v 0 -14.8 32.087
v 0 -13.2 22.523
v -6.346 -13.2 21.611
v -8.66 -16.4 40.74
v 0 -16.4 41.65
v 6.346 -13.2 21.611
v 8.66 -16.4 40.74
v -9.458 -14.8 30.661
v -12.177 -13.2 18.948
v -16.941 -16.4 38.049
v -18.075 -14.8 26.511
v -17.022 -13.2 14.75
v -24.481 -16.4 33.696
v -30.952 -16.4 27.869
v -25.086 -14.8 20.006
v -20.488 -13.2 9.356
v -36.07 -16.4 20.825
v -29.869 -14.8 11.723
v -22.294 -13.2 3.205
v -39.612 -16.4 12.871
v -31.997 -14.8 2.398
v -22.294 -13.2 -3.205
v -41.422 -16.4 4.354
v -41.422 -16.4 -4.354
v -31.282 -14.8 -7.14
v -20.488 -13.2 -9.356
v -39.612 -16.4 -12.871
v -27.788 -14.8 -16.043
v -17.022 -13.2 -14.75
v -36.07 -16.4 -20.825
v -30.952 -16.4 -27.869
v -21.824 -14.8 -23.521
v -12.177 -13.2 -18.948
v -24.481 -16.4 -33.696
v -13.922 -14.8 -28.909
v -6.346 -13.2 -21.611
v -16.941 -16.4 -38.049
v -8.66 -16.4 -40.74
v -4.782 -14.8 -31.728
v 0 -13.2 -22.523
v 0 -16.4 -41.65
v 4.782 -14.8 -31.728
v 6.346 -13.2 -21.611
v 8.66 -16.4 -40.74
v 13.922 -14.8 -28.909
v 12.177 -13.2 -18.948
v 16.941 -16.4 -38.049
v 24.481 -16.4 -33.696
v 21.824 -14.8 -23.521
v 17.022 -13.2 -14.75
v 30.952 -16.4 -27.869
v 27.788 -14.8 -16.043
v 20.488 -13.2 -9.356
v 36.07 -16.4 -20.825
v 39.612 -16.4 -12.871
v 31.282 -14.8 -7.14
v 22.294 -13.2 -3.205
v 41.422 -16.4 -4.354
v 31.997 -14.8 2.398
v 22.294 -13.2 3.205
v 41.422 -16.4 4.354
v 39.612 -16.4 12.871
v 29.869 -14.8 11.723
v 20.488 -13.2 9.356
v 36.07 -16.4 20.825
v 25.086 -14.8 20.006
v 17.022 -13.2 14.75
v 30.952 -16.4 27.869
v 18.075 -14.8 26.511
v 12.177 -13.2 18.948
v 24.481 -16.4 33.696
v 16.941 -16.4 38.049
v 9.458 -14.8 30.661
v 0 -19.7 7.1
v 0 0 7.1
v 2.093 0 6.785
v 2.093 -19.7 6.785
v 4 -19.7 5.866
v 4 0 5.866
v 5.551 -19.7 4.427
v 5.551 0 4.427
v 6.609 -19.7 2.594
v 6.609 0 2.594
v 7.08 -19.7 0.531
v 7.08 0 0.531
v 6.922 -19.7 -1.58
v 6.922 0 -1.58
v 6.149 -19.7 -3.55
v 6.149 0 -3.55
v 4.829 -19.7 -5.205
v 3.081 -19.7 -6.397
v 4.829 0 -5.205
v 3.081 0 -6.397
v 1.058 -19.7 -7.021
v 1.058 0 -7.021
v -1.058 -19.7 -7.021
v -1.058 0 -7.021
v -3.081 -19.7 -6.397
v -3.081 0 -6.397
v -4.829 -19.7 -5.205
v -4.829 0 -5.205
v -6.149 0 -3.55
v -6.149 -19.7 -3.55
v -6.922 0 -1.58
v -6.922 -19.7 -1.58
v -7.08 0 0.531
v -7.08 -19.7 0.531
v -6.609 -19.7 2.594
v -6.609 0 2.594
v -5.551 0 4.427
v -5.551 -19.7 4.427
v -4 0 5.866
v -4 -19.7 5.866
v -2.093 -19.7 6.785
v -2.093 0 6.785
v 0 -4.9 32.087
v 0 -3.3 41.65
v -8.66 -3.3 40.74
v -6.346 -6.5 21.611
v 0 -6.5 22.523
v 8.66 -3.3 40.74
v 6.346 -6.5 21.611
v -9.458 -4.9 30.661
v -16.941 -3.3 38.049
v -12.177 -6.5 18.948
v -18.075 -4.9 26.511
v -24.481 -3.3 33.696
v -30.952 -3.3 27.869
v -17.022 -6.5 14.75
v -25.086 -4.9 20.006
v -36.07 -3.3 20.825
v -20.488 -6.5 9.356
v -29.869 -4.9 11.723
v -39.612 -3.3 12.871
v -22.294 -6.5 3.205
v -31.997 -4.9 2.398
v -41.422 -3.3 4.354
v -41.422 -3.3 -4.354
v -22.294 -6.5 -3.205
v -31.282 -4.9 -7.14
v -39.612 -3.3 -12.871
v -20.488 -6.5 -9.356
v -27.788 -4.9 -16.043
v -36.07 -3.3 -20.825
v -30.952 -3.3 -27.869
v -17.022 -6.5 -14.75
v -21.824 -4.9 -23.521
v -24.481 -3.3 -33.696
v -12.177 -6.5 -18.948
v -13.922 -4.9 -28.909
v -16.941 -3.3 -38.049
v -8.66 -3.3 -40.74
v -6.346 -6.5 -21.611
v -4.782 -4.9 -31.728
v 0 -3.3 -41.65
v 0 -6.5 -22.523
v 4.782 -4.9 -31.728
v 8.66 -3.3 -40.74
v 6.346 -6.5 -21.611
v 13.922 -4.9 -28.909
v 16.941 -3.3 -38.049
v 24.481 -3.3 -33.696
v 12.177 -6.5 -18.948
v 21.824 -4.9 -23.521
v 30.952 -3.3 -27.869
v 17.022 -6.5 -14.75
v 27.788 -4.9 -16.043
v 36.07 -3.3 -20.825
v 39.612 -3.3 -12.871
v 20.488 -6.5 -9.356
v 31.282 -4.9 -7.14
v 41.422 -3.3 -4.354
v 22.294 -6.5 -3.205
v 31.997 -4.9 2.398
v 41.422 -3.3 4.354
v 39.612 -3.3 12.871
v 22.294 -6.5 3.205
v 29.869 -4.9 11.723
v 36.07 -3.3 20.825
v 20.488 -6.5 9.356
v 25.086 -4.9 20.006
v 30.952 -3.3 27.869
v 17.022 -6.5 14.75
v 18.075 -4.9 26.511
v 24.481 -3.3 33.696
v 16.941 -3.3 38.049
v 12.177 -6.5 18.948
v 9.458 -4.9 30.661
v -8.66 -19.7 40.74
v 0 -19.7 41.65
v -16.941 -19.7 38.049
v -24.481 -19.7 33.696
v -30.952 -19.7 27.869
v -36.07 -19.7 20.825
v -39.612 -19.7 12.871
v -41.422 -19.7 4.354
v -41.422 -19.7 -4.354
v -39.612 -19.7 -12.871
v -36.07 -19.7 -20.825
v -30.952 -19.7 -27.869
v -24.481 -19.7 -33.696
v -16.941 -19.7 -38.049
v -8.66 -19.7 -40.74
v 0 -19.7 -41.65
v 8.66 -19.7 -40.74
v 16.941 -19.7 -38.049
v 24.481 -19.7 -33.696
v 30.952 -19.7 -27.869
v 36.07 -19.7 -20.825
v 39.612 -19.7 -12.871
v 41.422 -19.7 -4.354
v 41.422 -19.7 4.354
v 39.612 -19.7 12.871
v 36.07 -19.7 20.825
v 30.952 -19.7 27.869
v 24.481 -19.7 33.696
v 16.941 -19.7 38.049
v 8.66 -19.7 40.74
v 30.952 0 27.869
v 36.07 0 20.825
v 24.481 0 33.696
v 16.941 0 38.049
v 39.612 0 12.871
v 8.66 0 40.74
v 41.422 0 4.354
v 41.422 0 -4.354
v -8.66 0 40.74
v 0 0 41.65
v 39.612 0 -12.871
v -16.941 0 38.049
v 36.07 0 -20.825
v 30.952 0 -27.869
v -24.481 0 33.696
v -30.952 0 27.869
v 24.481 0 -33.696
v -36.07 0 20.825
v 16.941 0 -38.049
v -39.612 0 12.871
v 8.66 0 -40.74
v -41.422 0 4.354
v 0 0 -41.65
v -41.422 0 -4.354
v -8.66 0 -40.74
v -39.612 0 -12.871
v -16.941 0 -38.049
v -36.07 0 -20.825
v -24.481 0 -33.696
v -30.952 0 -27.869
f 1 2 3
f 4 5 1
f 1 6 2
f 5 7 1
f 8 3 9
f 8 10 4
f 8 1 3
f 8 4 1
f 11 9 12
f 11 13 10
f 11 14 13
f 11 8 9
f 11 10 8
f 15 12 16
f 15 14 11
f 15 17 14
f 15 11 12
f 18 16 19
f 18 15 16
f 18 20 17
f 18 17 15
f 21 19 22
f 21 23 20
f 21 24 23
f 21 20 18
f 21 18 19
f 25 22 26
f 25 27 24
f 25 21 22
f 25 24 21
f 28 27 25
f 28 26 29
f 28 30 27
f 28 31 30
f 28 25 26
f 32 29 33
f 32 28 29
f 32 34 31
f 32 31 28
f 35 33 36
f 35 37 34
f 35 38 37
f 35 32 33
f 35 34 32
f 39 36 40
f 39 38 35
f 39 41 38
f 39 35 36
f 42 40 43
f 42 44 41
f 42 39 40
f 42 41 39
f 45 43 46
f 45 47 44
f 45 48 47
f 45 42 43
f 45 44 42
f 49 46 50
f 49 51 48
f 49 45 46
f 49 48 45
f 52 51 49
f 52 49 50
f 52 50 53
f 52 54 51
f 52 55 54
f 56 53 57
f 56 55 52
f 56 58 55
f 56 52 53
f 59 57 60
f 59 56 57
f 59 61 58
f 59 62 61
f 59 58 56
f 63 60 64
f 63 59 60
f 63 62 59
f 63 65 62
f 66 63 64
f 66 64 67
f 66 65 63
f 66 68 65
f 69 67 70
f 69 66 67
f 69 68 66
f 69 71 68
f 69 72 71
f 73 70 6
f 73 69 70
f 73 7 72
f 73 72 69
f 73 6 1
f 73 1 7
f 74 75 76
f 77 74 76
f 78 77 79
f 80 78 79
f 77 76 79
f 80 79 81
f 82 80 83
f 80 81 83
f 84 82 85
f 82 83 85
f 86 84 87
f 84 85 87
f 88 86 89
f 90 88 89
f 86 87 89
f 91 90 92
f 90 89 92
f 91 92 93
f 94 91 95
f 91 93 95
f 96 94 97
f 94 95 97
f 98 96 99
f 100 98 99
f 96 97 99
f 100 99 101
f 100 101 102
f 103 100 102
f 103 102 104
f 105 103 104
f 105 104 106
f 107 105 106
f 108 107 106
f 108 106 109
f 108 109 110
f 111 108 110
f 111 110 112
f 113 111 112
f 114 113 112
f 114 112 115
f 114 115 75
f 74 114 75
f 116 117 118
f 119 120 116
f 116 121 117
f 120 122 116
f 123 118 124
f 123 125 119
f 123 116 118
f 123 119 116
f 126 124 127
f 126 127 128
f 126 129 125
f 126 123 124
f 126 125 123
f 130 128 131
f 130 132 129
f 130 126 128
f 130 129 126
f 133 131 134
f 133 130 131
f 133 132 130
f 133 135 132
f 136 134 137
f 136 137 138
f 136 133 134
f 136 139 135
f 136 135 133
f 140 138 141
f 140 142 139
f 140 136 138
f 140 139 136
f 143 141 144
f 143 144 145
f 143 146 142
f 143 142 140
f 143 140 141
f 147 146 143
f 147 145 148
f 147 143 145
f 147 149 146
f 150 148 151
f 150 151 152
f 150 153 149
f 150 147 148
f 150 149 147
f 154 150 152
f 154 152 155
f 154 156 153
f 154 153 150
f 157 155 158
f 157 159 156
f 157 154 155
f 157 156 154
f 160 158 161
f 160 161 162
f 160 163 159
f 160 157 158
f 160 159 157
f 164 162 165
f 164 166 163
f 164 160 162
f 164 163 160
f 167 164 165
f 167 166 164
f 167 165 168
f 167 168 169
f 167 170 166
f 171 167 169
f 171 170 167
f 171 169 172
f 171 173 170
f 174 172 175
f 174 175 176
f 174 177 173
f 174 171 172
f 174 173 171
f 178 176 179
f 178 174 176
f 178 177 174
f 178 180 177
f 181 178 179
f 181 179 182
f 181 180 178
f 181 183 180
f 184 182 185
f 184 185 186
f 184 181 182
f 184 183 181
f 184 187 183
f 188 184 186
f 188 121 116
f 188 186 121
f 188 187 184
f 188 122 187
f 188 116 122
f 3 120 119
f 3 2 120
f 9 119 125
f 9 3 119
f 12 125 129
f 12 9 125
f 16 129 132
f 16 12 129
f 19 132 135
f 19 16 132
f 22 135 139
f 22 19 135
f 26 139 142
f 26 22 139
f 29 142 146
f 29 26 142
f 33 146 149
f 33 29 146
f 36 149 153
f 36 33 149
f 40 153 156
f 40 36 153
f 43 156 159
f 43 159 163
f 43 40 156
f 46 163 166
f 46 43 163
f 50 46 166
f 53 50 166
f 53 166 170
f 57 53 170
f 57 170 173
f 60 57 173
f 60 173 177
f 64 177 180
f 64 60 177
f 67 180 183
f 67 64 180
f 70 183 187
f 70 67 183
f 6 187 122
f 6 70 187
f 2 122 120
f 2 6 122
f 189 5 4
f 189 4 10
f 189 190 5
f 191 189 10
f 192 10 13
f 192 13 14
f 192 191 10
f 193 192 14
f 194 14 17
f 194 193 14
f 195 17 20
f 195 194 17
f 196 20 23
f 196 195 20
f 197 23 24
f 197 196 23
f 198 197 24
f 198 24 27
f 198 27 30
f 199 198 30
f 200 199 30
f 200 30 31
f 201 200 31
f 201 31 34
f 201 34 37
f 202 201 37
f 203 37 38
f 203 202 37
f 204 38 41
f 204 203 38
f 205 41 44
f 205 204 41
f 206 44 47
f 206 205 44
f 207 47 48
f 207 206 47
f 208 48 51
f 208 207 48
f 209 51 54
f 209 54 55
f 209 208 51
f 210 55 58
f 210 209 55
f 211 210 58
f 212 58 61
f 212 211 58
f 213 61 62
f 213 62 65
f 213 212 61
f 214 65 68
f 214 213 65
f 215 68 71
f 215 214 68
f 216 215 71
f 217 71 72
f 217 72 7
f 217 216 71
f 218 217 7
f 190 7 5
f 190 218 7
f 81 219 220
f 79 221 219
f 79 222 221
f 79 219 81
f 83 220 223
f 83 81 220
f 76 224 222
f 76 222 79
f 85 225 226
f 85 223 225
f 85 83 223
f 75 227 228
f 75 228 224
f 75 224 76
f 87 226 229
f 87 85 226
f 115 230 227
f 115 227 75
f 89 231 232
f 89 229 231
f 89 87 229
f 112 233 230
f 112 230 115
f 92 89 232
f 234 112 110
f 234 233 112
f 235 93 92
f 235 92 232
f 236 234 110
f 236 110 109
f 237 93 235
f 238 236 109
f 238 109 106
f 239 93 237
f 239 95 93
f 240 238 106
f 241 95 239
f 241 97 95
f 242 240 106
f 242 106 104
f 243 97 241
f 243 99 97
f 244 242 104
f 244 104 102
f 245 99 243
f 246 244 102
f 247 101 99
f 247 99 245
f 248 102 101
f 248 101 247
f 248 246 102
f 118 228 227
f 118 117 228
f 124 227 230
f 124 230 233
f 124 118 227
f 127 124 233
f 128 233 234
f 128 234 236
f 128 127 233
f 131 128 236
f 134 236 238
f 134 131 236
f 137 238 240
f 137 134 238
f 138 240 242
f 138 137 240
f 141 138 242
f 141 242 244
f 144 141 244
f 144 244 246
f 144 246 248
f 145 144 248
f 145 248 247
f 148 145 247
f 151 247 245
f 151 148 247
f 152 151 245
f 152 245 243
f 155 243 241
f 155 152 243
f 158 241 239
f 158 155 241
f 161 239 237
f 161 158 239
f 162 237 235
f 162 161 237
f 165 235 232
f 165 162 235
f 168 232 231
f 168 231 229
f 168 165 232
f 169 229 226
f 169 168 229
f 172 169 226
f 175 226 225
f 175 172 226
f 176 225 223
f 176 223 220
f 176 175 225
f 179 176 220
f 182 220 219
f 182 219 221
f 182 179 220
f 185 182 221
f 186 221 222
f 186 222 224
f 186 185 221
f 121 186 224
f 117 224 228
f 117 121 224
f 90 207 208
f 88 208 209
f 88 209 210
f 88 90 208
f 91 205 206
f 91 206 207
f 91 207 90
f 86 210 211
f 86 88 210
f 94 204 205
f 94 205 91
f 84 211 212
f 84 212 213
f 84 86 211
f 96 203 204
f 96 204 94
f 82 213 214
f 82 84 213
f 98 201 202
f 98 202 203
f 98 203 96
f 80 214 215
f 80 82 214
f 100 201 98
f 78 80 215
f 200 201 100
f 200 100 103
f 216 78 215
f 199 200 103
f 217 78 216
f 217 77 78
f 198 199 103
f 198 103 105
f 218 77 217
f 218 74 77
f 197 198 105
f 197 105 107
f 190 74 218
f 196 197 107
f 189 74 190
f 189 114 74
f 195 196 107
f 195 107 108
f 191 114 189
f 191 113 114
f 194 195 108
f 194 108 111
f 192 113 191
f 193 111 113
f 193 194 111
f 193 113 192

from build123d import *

# Parameters (mm, degrees)
SKETCH2_R          = 7.1
CUT_EXTRUDE1_DEPTH = 63.109057311


with BuildPart() as part:
    # Sketch1 → Revolve1 (revolve)
    with BuildSketch(Plane(origin=(0, 0, 0), x_dir=(0, 0, -1), z_dir=(1, 0, 0)), mode=Mode.PRIVATE) as revolve1_sk:
        Polygon((0, 0), (41.65, 0), (41.65, -3.3), (22.523249986, -6.5), (22.523249986, -13.2), (41.65, -16.4), (41.65, -19.7), (0, -19.7), align=None)
    revolve(revolve1_sk.sketch.rotate(Axis((0, 0, 0), (0, -1, 0)), 180), axis=Axis((0, 0, 0), (0, -1, 0)))

    # Sketch2 → Cut-Extrude1 (cut, through all)
    with BuildSketch(Plane(origin=(0, 0, 0), x_dir=(1, 0, 0), z_dir=(0, 1, 0))):
        with Locations(Location((0, 0, 0), (0, 0, 270))):
            Circle(SKETCH2_R)
    extrude(amount=-CUT_EXTRUDE1_DEPTH, mode=Mode.SUBTRACT)


solid = part.part
